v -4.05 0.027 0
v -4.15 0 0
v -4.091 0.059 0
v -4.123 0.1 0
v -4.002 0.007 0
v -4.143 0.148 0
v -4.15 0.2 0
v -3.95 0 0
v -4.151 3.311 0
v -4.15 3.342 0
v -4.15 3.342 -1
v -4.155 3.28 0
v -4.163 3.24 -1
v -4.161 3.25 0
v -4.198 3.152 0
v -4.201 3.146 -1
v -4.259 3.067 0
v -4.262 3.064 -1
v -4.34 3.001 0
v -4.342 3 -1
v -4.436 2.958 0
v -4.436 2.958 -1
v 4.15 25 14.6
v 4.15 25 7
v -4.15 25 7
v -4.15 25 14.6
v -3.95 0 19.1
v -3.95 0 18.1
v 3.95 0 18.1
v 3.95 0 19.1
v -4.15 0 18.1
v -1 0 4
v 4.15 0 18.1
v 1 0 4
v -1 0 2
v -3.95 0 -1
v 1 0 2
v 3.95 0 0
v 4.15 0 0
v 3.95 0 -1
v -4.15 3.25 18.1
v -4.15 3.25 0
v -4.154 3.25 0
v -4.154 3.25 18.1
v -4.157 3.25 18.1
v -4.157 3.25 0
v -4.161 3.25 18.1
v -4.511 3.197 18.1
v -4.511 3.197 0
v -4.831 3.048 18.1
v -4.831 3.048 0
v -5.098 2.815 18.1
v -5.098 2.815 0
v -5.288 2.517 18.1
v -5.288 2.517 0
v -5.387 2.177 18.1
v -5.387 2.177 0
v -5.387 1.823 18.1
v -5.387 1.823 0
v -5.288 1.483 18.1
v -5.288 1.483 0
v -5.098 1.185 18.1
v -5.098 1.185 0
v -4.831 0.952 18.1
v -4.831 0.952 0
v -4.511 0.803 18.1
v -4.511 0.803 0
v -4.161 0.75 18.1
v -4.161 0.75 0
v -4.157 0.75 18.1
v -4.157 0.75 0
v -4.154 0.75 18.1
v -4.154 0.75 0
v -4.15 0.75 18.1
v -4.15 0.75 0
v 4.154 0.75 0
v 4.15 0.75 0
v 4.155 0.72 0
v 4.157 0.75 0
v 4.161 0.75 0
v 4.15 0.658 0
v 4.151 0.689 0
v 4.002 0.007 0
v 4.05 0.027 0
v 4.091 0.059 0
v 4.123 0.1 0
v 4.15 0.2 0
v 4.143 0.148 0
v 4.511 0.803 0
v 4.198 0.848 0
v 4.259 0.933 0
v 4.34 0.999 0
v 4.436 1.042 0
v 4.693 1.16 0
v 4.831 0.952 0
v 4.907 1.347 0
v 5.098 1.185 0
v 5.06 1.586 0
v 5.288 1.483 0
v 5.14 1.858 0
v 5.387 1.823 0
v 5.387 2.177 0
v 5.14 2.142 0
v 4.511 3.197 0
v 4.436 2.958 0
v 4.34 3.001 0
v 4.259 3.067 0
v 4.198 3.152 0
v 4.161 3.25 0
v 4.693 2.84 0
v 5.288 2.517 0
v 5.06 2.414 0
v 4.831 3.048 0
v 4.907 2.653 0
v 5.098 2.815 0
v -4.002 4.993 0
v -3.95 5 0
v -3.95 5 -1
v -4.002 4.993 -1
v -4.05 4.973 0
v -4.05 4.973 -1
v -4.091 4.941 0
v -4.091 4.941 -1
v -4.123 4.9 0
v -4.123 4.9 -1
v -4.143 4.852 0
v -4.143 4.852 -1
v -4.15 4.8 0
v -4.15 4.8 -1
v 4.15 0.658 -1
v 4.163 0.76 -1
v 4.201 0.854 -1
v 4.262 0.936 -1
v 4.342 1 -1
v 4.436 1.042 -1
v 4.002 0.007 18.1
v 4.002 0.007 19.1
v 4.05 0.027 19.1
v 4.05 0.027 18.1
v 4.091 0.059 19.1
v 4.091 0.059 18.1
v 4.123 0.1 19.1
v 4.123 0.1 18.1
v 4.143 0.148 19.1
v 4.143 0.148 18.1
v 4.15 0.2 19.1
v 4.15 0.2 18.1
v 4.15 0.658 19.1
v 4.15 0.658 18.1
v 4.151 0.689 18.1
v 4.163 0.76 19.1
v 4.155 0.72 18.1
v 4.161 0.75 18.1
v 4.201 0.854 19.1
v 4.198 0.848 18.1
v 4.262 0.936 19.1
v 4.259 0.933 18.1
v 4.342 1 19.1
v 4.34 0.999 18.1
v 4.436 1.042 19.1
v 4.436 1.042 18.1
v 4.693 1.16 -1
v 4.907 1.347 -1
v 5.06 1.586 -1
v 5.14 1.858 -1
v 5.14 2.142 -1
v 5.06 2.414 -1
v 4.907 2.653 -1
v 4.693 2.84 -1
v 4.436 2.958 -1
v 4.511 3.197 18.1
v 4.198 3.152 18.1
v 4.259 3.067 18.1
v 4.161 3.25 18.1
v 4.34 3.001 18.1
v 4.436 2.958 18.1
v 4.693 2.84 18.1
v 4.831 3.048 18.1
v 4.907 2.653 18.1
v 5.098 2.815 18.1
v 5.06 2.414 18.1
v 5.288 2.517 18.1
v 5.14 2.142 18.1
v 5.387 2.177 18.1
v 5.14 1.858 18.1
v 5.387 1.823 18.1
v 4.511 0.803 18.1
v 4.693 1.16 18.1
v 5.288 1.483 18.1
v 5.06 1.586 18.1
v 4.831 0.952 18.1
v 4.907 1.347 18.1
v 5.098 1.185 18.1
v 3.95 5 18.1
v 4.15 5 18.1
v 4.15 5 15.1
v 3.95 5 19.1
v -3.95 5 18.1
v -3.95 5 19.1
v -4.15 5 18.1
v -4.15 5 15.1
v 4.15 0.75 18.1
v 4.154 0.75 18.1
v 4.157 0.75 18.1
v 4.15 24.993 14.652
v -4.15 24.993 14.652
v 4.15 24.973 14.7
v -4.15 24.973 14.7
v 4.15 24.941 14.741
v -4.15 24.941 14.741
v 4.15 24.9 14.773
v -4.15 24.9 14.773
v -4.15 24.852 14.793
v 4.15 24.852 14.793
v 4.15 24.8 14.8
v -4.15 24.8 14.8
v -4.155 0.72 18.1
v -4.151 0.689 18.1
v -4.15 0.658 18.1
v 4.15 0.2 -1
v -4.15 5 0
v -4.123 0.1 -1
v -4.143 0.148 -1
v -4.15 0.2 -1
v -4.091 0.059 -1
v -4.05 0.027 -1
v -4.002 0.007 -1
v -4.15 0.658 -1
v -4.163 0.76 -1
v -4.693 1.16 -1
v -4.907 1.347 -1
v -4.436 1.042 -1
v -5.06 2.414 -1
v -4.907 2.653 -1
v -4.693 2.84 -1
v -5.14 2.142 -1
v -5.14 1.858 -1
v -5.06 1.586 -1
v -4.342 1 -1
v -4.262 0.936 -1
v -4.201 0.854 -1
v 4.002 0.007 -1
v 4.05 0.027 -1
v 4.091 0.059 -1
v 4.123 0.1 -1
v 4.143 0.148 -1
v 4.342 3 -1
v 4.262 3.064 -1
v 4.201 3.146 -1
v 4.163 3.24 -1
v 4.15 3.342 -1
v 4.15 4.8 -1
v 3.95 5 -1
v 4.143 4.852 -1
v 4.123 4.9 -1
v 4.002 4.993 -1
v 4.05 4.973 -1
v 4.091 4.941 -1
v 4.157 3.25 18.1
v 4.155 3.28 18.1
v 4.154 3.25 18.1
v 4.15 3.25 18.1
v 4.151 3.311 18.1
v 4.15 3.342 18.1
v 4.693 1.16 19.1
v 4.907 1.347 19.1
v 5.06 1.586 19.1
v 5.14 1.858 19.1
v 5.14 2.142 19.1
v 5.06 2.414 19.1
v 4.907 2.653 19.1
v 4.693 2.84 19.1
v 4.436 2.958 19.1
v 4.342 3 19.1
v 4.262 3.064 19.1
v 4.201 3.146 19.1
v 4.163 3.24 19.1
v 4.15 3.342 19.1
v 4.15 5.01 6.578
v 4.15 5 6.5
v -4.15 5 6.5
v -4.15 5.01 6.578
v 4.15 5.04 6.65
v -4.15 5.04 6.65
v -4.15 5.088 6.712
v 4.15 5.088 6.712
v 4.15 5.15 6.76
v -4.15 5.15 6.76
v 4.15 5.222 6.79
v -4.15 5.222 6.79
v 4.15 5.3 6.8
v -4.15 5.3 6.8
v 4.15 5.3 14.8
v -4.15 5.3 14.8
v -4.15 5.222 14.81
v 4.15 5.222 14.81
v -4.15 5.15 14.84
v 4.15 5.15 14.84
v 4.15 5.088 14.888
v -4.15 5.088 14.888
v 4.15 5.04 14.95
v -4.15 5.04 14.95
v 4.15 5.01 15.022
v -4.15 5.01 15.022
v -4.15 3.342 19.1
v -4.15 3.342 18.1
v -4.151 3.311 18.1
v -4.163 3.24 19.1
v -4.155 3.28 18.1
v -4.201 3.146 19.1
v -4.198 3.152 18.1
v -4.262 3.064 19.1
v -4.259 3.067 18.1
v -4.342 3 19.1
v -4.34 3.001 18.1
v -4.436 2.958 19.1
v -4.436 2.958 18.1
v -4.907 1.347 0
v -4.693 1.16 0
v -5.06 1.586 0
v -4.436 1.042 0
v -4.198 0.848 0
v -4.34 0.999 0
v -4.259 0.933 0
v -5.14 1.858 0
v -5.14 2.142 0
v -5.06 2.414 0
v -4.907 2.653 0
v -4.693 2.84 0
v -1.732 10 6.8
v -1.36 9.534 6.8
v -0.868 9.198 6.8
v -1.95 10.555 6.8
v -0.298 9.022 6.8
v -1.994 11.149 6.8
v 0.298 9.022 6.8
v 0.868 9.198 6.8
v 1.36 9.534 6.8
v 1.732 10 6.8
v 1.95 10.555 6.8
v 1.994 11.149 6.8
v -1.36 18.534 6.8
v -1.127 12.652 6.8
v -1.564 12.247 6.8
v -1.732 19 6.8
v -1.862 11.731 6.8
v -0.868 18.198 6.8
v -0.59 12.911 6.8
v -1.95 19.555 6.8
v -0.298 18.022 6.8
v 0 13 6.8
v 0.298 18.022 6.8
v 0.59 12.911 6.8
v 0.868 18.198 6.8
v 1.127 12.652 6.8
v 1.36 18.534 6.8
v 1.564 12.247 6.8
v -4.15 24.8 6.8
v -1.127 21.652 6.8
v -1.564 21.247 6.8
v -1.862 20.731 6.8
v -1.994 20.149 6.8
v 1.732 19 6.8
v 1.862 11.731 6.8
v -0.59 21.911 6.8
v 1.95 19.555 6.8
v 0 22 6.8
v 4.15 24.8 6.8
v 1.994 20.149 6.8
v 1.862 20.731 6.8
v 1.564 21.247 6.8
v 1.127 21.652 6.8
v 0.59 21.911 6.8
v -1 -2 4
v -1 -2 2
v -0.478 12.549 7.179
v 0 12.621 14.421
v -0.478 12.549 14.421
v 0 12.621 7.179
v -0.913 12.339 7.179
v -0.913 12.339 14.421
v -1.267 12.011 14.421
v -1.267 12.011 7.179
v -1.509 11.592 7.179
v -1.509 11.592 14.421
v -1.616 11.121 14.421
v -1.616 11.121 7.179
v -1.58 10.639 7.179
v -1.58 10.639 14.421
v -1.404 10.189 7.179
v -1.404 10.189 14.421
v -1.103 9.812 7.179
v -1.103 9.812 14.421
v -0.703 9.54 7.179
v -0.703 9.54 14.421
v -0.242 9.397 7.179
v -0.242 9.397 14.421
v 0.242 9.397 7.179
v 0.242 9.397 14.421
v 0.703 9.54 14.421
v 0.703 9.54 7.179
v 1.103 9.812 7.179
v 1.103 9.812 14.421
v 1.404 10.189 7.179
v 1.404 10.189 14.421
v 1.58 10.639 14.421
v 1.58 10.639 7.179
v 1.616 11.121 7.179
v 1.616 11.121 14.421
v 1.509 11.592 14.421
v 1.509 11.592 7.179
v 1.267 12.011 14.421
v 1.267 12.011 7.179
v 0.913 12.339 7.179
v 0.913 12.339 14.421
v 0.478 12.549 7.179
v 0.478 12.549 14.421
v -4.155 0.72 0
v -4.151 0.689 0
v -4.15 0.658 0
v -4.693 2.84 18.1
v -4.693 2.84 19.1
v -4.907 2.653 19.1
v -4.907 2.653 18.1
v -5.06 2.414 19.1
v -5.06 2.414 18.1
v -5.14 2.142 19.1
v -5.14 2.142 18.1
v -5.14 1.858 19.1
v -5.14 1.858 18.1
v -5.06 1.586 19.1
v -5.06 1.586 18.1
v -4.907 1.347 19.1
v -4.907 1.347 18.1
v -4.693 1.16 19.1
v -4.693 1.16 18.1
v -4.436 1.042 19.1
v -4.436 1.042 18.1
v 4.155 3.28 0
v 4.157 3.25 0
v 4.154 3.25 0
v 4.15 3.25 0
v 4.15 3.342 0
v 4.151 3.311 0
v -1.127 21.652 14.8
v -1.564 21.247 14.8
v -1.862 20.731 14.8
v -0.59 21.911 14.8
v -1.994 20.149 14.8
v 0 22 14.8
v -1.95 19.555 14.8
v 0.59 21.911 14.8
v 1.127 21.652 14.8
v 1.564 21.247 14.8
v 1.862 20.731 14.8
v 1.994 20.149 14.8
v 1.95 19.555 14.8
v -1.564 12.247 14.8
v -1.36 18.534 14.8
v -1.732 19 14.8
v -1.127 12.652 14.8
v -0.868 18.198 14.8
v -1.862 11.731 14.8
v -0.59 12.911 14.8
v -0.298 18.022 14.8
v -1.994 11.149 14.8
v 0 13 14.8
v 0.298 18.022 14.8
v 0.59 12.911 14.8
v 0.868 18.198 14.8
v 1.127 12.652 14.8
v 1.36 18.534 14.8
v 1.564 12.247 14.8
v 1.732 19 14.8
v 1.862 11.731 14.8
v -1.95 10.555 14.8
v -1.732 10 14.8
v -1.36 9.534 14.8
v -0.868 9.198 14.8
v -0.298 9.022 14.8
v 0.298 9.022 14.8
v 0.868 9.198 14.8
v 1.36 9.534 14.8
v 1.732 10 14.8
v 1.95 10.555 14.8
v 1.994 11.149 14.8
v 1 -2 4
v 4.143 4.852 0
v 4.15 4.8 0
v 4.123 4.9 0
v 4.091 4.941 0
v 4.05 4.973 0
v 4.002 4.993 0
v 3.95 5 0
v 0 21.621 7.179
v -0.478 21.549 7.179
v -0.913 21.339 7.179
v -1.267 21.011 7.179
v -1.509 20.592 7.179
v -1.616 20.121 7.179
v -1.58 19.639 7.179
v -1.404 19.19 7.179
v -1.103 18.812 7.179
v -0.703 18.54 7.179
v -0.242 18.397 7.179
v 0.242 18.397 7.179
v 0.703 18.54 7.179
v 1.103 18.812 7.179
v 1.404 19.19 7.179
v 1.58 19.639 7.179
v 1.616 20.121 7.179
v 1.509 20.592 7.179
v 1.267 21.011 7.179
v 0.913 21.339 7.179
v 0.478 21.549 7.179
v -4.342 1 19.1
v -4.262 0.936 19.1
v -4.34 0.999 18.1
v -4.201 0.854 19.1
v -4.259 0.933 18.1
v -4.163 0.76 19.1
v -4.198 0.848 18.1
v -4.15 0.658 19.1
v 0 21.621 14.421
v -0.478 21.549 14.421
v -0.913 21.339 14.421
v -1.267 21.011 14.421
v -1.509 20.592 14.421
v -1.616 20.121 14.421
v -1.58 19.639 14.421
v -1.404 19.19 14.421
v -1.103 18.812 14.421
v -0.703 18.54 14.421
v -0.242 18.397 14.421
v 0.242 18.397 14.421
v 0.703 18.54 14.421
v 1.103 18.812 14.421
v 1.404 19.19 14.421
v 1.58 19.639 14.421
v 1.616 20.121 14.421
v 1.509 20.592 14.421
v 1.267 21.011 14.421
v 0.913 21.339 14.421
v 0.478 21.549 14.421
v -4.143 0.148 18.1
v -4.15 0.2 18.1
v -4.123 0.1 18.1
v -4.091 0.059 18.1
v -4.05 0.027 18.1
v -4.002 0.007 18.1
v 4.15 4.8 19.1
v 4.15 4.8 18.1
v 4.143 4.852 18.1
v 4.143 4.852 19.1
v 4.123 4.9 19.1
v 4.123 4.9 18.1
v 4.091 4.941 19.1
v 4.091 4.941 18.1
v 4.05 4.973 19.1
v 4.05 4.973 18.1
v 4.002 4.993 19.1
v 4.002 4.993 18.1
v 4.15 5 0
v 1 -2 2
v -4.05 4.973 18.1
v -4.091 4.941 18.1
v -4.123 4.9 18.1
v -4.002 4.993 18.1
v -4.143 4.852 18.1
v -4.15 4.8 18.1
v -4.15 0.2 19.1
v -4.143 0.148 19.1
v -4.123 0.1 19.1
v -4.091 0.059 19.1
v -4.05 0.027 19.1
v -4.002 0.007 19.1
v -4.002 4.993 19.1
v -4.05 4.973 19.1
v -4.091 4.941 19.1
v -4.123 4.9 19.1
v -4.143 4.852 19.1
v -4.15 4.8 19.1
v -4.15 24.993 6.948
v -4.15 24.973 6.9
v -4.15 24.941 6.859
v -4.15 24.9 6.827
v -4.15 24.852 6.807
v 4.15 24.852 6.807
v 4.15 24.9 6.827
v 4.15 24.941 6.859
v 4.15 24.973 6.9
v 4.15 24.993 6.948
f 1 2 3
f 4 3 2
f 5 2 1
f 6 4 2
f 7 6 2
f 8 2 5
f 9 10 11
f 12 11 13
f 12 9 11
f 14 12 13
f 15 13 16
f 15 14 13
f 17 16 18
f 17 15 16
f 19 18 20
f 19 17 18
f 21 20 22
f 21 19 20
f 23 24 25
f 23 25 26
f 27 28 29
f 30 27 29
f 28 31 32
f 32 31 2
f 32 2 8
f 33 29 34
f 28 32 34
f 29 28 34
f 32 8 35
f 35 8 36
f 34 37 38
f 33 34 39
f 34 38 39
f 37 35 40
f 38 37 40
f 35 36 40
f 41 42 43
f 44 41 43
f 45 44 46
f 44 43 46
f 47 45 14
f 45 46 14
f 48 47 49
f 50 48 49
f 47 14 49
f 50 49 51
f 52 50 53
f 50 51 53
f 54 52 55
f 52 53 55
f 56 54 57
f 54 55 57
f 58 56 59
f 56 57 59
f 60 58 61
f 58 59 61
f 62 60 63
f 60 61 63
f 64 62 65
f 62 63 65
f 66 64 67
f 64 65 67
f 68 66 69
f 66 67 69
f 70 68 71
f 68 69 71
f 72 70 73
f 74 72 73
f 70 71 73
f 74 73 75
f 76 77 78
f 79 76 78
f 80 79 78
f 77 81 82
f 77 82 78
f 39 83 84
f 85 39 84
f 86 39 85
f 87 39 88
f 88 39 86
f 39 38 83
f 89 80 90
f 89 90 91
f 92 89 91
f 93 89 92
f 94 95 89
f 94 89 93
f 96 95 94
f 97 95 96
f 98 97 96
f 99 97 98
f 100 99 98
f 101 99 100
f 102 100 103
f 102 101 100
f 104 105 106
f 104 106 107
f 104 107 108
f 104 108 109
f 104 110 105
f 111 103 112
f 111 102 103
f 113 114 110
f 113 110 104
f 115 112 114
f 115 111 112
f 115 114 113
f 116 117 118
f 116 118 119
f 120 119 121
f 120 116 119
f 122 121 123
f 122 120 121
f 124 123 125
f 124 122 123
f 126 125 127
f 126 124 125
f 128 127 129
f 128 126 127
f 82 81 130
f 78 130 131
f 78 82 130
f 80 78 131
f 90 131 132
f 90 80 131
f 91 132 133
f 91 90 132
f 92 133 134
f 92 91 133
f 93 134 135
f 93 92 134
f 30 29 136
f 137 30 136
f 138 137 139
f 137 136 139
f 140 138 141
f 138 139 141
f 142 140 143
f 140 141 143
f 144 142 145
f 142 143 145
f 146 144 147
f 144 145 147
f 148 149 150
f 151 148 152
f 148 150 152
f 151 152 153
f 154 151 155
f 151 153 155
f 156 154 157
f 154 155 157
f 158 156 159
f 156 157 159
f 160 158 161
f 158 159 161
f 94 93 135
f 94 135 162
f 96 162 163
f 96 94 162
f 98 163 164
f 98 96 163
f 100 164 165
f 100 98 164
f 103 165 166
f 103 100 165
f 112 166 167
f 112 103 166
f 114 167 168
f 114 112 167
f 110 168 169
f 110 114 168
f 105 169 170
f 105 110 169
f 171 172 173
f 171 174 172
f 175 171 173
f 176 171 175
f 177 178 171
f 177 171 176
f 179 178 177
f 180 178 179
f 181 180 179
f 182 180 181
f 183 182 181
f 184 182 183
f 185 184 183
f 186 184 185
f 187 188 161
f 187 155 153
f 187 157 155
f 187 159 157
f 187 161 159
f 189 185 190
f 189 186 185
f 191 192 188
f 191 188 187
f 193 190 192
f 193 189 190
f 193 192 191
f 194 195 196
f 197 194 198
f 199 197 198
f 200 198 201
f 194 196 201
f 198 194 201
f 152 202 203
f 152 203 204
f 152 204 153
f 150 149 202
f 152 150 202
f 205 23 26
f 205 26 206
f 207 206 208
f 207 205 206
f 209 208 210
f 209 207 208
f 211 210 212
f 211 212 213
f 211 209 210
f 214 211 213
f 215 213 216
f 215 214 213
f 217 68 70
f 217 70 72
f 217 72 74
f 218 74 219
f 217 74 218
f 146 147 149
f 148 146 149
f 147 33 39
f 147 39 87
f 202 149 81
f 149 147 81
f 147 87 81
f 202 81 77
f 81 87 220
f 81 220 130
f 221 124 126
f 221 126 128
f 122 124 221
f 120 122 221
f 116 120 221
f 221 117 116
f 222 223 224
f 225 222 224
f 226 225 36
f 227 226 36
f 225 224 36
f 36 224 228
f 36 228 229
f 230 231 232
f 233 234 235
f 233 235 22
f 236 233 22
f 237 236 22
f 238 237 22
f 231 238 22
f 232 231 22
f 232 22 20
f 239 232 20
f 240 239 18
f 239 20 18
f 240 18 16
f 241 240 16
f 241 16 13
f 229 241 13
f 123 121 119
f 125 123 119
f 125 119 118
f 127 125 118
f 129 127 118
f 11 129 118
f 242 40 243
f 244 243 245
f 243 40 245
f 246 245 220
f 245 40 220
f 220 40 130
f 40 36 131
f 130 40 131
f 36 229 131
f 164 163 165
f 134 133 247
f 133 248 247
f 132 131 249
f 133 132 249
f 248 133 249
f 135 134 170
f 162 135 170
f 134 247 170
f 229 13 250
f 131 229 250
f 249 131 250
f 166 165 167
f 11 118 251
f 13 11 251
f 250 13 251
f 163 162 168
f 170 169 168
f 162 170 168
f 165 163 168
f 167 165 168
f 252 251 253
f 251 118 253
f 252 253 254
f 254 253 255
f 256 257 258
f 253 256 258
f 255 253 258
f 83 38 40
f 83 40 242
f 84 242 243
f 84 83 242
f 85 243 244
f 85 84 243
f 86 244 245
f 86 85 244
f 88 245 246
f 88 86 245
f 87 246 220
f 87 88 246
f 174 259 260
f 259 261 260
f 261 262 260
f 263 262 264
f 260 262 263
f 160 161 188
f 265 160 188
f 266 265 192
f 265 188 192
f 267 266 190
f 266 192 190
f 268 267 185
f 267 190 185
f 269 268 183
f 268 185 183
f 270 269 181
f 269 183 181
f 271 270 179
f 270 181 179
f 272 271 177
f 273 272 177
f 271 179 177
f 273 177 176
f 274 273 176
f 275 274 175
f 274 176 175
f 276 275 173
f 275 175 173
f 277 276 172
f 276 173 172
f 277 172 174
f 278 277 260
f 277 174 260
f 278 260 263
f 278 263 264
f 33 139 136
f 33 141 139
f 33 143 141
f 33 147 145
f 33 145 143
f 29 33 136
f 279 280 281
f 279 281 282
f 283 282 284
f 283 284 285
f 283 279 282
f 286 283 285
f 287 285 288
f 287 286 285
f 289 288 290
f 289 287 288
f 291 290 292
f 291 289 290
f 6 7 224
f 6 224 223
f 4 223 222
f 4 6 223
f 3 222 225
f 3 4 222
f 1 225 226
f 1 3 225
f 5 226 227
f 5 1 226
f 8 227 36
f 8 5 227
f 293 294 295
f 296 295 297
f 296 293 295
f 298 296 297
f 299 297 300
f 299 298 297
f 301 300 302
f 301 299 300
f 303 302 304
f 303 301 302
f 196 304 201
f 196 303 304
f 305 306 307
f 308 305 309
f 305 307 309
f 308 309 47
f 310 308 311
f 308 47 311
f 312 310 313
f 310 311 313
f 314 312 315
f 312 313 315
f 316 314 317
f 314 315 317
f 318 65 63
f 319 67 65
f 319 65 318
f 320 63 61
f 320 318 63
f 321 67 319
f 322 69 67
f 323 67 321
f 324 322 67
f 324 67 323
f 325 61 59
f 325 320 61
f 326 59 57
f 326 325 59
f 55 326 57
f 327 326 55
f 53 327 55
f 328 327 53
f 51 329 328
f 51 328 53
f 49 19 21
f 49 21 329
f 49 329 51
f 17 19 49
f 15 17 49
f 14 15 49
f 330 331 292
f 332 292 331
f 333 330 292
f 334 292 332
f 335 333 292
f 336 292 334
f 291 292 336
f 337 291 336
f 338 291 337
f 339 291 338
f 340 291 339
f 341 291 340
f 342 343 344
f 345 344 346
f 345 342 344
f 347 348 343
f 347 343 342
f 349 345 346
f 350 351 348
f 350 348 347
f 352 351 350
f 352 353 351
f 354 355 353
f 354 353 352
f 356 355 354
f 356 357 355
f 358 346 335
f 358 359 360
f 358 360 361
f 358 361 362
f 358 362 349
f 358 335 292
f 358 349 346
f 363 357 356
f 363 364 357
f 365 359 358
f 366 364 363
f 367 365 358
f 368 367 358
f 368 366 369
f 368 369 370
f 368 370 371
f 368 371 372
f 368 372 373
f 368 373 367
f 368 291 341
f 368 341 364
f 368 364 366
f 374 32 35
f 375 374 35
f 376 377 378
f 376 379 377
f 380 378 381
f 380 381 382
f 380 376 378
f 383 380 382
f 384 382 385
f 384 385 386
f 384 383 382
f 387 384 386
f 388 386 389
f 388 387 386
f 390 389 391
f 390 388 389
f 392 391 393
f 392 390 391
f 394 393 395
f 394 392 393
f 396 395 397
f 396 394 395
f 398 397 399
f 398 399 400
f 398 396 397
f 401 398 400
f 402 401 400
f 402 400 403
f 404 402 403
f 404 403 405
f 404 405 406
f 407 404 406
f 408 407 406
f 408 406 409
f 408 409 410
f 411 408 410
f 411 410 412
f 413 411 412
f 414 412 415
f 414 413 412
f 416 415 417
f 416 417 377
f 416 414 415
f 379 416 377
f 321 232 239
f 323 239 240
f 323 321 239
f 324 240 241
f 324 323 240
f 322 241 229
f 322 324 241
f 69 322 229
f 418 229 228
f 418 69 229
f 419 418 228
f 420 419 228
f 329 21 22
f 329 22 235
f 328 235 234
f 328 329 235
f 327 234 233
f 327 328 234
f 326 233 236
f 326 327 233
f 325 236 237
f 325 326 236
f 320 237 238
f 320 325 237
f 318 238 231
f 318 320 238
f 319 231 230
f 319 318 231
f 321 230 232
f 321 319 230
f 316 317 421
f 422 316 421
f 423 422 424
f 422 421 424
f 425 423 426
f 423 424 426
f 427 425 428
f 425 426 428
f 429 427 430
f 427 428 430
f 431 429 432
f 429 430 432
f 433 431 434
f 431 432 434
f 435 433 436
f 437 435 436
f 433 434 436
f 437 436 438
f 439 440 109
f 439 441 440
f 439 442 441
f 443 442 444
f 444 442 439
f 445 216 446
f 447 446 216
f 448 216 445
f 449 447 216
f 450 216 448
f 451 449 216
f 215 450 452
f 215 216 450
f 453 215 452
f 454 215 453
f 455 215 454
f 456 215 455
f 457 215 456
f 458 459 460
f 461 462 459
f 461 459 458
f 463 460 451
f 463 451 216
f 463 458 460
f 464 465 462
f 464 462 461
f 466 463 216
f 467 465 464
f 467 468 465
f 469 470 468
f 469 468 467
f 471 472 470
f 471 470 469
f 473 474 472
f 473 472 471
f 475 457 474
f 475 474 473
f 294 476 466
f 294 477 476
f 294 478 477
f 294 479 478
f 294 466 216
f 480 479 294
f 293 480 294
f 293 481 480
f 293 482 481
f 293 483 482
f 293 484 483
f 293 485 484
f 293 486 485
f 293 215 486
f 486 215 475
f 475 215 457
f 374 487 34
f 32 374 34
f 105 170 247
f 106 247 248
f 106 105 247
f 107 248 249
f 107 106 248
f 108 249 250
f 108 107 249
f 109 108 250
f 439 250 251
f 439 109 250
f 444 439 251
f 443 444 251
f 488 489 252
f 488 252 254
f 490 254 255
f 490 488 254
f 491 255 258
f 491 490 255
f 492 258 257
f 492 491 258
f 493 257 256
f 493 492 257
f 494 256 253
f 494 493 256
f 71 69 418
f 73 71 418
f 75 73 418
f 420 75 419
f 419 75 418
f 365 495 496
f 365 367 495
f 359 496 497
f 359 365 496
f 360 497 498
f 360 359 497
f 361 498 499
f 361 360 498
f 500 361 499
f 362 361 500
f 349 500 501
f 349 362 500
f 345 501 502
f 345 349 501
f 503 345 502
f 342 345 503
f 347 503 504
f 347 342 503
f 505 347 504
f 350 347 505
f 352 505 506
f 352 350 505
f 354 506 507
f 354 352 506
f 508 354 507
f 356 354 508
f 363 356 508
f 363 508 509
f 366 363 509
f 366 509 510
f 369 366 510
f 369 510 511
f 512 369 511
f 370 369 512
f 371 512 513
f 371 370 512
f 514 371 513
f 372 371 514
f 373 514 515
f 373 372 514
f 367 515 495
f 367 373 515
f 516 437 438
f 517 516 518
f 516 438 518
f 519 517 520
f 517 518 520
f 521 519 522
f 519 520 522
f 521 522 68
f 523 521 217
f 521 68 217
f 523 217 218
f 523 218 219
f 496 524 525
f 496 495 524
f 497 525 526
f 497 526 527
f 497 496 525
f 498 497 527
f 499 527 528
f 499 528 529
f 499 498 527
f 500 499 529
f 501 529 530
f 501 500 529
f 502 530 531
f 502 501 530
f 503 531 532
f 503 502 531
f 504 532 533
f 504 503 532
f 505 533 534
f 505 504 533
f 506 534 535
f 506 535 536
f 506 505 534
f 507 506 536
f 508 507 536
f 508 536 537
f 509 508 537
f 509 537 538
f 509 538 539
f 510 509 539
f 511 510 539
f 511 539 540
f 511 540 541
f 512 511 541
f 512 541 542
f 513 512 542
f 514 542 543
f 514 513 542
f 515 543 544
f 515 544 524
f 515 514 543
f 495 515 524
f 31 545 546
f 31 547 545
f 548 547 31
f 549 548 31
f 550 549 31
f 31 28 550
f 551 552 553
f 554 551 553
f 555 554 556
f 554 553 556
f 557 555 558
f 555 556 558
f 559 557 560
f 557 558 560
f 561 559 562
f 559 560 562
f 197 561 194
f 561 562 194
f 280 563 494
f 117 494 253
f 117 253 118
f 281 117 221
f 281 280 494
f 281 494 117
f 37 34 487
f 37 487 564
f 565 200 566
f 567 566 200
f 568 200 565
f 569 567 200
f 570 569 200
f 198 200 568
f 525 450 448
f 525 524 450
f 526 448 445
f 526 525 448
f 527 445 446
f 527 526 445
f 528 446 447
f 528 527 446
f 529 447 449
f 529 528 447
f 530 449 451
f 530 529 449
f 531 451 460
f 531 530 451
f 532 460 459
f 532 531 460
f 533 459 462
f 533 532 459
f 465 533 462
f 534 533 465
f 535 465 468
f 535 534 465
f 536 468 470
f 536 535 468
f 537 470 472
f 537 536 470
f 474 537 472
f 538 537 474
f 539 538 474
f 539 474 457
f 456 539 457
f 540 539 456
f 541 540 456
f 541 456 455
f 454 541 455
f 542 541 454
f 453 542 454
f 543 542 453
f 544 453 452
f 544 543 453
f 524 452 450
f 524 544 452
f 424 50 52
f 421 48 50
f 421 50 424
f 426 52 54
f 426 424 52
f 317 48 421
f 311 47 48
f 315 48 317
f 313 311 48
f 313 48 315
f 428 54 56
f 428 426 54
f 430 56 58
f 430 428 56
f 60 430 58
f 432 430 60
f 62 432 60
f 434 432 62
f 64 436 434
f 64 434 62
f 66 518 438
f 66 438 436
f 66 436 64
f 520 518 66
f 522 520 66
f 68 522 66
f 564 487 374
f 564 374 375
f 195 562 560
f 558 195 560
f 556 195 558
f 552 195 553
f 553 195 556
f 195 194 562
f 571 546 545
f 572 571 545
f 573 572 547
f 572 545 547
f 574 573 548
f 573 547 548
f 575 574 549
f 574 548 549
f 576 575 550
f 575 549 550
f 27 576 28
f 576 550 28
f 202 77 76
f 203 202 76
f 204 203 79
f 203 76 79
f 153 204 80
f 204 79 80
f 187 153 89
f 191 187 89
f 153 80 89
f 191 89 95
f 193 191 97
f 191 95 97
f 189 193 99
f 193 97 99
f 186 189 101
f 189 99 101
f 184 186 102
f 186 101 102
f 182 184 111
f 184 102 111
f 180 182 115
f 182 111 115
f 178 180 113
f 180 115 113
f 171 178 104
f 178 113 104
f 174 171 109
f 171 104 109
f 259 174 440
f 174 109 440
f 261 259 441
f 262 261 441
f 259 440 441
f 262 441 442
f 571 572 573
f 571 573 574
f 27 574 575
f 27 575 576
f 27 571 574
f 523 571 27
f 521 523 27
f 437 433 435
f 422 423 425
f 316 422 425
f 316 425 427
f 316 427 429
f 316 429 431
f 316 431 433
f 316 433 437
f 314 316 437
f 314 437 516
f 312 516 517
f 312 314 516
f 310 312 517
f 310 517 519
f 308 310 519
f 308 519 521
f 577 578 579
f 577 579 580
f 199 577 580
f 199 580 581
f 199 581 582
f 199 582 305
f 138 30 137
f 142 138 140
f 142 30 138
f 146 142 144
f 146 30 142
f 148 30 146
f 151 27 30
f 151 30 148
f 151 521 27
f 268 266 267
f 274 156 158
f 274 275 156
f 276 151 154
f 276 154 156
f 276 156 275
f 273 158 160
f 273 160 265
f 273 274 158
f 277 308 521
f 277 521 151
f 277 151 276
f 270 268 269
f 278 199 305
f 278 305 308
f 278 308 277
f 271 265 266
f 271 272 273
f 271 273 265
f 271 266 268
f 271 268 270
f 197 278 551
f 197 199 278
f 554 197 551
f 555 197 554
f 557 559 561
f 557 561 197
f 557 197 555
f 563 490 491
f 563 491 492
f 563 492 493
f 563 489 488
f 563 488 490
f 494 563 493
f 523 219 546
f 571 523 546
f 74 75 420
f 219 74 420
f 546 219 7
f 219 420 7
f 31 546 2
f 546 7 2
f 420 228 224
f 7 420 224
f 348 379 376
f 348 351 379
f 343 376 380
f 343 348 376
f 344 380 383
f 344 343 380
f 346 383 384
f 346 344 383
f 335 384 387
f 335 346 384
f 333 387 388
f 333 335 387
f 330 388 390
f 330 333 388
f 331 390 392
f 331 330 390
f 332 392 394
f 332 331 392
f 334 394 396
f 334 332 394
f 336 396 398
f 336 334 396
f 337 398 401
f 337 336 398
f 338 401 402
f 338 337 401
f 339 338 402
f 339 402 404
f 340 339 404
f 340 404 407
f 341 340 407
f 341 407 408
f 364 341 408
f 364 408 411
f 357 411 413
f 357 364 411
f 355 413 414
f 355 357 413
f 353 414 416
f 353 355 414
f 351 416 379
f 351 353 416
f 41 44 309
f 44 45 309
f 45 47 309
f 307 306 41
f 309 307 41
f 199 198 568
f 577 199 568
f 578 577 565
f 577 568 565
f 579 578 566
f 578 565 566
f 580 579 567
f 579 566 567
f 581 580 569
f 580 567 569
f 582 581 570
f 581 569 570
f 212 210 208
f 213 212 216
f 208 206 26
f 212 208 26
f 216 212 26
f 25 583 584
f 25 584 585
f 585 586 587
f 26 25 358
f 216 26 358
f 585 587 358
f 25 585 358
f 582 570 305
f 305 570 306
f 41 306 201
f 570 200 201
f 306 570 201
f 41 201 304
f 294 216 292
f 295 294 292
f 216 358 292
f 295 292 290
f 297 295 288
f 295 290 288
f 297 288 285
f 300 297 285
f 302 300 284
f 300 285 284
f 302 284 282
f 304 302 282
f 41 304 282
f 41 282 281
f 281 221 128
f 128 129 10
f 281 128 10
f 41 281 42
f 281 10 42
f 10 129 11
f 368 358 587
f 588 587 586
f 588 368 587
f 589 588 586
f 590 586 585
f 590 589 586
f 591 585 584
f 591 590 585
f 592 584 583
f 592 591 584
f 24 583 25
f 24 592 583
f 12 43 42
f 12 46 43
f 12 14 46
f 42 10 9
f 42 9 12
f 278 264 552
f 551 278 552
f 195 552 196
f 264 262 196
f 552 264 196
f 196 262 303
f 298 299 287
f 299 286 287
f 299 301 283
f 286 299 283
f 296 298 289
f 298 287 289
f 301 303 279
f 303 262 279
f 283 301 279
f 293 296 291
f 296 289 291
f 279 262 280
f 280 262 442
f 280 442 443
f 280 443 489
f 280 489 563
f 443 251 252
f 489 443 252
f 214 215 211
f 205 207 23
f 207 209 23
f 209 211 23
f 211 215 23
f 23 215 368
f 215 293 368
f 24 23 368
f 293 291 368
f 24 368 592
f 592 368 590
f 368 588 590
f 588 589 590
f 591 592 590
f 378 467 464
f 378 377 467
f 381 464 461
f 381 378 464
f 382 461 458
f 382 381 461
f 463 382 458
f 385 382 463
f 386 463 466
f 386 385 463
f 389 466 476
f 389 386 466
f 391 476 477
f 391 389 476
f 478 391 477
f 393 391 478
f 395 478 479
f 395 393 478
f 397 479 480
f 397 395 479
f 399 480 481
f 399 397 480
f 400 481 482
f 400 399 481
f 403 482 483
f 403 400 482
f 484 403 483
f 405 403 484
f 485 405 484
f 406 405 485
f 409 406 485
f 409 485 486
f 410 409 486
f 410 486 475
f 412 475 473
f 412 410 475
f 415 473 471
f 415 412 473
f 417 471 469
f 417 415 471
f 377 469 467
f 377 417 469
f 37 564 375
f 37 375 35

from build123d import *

# Parameters (mm, degrees)
BOSS_EXTRUDE1_DEPTH      = 4.15
BOSS_EXTRUDE1_DEPTH_BACK = 4.15
BOSS_EXTRUDE2_DEPTH      = 18.1
BOSS_EXTRUDE3_DEPTH      = 1
BOSS_EXTRUDE4_DEPTH      = 1
SKETCH7_W                = 2
SKETCH7_H                = 2
BOSS_EXTRUDE5_DEPTH      = 1
BOSS_EXTRUDE5_DEPTH_BACK = 1


with BuildPart() as part:
    # Sketch1 → Boss-Extrude1 (new body, two sides)
    with BuildSketch(Plane(origin=(0, 0, 0), x_dir=(0, 0, -1), z_dir=(1, 0, 0))) as boss_extrude1_sk:
        with BuildLine():
            Line((-18.1, 5), (-18.1, 0))
            Line((-18.1, 0), (0, 0))
            Line((0, 0), (0, 5))
            Line((0, 5), (-6.5, 5))
            ThreePointArc((-6.5, 5), (-6.712132034, 5.087867966), (-6.8, 5.3))
            Line((-6.8, 5.3), (-6.8, 24.8))
            ThreePointArc((-6.8, 24.8), (-6.858578644, 24.941421356), (-7, 25))
            Line((-7, 25), (-14.6, 25))
            ThreePointArc((-14.6, 25), (-14.741421356, 24.941421356), (-14.8, 24.8))
            Line((-14.8, 24.8), (-14.8, 5.3))
            ThreePointArc((-14.8, 5.3), (-14.887867966, 5.087867966), (-15.1, 5))
            Line((-15.1, 5), (-18.1, 5))
        make_face()
    extrude(amount=BOSS_EXTRUDE1_DEPTH)
    extrude(boss_extrude1_sk.sketch, amount=-BOSS_EXTRUDE1_DEPTH_BACK)

    # Sketch2 → Cut-Revolve1 (revolve, cut)
    with BuildSketch(Plane(origin=(0, 0, 0), x_dir=(0, 0, -1), z_dir=(1, 0, 0))):
        Polygon((-14.8, 20), (-14.8, 22), (-14.421, 21.621), (-7.179, 21.621), (-6.8, 22), (-6.8, 20), align=None)
    revolve(axis=Axis((0, 20, 6.8), (0, 0, 1)), mode=Mode.SUBTRACT)

    # Sketch3 → Cut-Revolve2 (revolve, cut)
    with BuildSketch(Plane(origin=(0, 0, 0), x_dir=(0, 0, -1), z_dir=(1, 0, 0))):
        Polygon((-14.8, 11), (-14.8, 13), (-14.421, 12.621), (-7.179, 12.621), (-6.8, 13), (-6.8, 11), align=None)
    revolve(axis=Axis((0, 11, 6.8), (0, 0, 1)), mode=Mode.SUBTRACT)

    # Sketch4 → Boss-Extrude2 (add)
    with BuildSketch(Plane.XY):
        with BuildLine():
            Line((-4.15, 0.75), (4.15, 0.75))
            ThreePointArc((4.15, 0.75), (5.4, 2), (4.15, 3.25))
            Line((4.15, 3.25), (-4.15, 3.25))
            ThreePointArc((-4.15, 3.25), (-5.4, 2), (-4.15, 0.75))
        make_face()
    extrude(amount=BOSS_EXTRUDE2_DEPTH)

    # Sketch5 → Boss-Extrude3 (add)
    with BuildSketch(Plane.XY):
        with BuildLine():
            Line((-4.15, 0.658359214), (-4.15, 0.2))
            ThreePointArc((-4.15, 0.2), (-4.091421356, 0.058578644), (-3.95, 0))
            Line((-3.95, 0), (3.95, 0))
            ThreePointArc((3.95, 0), (4.091421356, 0.058578644), (4.15, 0.2))
            Line((4.15, 0.2), (4.15, 0.658359214))
            ThreePointArc((4.15, 0.658359214), (4.22928651, 0.897404935), (4.435714286, 1.041685153))
            ThreePointArc((4.435714286, 1.041685153), (5.15, 2), (4.435714286, 2.958314847))
            ThreePointArc((4.435714286, 2.958314847), (4.22928651, 3.102595065), (4.15, 3.341640786))
            Line((4.15, 3.341640786), (4.15, 4.8))
            ThreePointArc((4.15, 4.8), (4.091421356, 4.941421356), (3.95, 5))
            Line((3.95, 5), (-3.95, 5))
            ThreePointArc((-3.95, 5), (-4.091421356, 4.941421356), (-4.15, 4.8))
            Line((-4.15, 4.8), (-4.15, 3.341640786))
            ThreePointArc((-4.15, 3.341640786), (-4.22928651, 3.102595065), (-4.435714286, 2.958314847))
            ThreePointArc((-4.435714286, 2.958314847), (-5.15, 2), (-4.435714286, 1.041685153))
            ThreePointArc((-4.435714286, 1.041685153), (-4.22928651, 0.897404935), (-4.15, 0.658359214))
        make_face()
    extrude(amount=-BOSS_EXTRUDE3_DEPTH)

    # Sketch6 → Boss-Extrude4 (add)
    with BuildSketch(Plane.XY.offset(18.1)):
        with BuildLine():
            Line((-4.15, 0.658359214), (-4.15, 0.2))
            ThreePointArc((-4.15, 0.2), (-4.091421356, 0.058578644), (-3.95, 0))
            Line((-3.95, 0), (3.95, 0))
            ThreePointArc((3.95, 0), (4.091421356, 0.058578644), (4.15, 0.2))
            Line((4.15, 0.2), (4.15, 0.658359214))
            ThreePointArc((4.15, 0.658359214), (4.22928651, 0.897404935), (4.435714286, 1.041685153))
            ThreePointArc((4.435714286, 1.041685153), (5.15, 2), (4.435714286, 2.958314847))
            ThreePointArc((4.435714286, 2.958314847), (4.22928651, 3.102595065), (4.15, 3.341640786))
            Line((4.15, 3.341640786), (4.15, 4.8))
            ThreePointArc((4.15, 4.8), (4.091421356, 4.941421356), (3.95, 5))
            Line((3.95, 5), (-3.95, 5))
            ThreePointArc((-3.95, 5), (-4.091421356, 4.941421356), (-4.15, 4.8))
            Line((-4.15, 4.8), (-4.15, 3.341640786))
            ThreePointArc((-4.15, 3.341640786), (-4.22928651, 3.102595065), (-4.435714286, 2.958314847))
            ThreePointArc((-4.435714286, 2.958314847), (-5.15, 2), (-4.435714286, 1.041685153))
            ThreePointArc((-4.435714286, 1.041685153), (-4.22928651, 0.897404935), (-4.15, 0.658359214))
        make_face()
    extrude(amount=BOSS_EXTRUDE4_DEPTH)

    # Sketch7 → Boss-Extrude5 (add, two sides)
    with BuildSketch(Plane(origin=(0, 0, 0), x_dir=(0, 0, -1), z_dir=(1, 0, 0))) as boss_extrude5_sk:
        with Locations((-3, -1)):
            Rectangle(SKETCH7_W, SKETCH7_H)
    extrude(amount=BOSS_EXTRUDE5_DEPTH)
    extrude(boss_extrude5_sk.sketch, amount=-BOSS_EXTRUDE5_DEPTH_BACK)


solid = part.part
